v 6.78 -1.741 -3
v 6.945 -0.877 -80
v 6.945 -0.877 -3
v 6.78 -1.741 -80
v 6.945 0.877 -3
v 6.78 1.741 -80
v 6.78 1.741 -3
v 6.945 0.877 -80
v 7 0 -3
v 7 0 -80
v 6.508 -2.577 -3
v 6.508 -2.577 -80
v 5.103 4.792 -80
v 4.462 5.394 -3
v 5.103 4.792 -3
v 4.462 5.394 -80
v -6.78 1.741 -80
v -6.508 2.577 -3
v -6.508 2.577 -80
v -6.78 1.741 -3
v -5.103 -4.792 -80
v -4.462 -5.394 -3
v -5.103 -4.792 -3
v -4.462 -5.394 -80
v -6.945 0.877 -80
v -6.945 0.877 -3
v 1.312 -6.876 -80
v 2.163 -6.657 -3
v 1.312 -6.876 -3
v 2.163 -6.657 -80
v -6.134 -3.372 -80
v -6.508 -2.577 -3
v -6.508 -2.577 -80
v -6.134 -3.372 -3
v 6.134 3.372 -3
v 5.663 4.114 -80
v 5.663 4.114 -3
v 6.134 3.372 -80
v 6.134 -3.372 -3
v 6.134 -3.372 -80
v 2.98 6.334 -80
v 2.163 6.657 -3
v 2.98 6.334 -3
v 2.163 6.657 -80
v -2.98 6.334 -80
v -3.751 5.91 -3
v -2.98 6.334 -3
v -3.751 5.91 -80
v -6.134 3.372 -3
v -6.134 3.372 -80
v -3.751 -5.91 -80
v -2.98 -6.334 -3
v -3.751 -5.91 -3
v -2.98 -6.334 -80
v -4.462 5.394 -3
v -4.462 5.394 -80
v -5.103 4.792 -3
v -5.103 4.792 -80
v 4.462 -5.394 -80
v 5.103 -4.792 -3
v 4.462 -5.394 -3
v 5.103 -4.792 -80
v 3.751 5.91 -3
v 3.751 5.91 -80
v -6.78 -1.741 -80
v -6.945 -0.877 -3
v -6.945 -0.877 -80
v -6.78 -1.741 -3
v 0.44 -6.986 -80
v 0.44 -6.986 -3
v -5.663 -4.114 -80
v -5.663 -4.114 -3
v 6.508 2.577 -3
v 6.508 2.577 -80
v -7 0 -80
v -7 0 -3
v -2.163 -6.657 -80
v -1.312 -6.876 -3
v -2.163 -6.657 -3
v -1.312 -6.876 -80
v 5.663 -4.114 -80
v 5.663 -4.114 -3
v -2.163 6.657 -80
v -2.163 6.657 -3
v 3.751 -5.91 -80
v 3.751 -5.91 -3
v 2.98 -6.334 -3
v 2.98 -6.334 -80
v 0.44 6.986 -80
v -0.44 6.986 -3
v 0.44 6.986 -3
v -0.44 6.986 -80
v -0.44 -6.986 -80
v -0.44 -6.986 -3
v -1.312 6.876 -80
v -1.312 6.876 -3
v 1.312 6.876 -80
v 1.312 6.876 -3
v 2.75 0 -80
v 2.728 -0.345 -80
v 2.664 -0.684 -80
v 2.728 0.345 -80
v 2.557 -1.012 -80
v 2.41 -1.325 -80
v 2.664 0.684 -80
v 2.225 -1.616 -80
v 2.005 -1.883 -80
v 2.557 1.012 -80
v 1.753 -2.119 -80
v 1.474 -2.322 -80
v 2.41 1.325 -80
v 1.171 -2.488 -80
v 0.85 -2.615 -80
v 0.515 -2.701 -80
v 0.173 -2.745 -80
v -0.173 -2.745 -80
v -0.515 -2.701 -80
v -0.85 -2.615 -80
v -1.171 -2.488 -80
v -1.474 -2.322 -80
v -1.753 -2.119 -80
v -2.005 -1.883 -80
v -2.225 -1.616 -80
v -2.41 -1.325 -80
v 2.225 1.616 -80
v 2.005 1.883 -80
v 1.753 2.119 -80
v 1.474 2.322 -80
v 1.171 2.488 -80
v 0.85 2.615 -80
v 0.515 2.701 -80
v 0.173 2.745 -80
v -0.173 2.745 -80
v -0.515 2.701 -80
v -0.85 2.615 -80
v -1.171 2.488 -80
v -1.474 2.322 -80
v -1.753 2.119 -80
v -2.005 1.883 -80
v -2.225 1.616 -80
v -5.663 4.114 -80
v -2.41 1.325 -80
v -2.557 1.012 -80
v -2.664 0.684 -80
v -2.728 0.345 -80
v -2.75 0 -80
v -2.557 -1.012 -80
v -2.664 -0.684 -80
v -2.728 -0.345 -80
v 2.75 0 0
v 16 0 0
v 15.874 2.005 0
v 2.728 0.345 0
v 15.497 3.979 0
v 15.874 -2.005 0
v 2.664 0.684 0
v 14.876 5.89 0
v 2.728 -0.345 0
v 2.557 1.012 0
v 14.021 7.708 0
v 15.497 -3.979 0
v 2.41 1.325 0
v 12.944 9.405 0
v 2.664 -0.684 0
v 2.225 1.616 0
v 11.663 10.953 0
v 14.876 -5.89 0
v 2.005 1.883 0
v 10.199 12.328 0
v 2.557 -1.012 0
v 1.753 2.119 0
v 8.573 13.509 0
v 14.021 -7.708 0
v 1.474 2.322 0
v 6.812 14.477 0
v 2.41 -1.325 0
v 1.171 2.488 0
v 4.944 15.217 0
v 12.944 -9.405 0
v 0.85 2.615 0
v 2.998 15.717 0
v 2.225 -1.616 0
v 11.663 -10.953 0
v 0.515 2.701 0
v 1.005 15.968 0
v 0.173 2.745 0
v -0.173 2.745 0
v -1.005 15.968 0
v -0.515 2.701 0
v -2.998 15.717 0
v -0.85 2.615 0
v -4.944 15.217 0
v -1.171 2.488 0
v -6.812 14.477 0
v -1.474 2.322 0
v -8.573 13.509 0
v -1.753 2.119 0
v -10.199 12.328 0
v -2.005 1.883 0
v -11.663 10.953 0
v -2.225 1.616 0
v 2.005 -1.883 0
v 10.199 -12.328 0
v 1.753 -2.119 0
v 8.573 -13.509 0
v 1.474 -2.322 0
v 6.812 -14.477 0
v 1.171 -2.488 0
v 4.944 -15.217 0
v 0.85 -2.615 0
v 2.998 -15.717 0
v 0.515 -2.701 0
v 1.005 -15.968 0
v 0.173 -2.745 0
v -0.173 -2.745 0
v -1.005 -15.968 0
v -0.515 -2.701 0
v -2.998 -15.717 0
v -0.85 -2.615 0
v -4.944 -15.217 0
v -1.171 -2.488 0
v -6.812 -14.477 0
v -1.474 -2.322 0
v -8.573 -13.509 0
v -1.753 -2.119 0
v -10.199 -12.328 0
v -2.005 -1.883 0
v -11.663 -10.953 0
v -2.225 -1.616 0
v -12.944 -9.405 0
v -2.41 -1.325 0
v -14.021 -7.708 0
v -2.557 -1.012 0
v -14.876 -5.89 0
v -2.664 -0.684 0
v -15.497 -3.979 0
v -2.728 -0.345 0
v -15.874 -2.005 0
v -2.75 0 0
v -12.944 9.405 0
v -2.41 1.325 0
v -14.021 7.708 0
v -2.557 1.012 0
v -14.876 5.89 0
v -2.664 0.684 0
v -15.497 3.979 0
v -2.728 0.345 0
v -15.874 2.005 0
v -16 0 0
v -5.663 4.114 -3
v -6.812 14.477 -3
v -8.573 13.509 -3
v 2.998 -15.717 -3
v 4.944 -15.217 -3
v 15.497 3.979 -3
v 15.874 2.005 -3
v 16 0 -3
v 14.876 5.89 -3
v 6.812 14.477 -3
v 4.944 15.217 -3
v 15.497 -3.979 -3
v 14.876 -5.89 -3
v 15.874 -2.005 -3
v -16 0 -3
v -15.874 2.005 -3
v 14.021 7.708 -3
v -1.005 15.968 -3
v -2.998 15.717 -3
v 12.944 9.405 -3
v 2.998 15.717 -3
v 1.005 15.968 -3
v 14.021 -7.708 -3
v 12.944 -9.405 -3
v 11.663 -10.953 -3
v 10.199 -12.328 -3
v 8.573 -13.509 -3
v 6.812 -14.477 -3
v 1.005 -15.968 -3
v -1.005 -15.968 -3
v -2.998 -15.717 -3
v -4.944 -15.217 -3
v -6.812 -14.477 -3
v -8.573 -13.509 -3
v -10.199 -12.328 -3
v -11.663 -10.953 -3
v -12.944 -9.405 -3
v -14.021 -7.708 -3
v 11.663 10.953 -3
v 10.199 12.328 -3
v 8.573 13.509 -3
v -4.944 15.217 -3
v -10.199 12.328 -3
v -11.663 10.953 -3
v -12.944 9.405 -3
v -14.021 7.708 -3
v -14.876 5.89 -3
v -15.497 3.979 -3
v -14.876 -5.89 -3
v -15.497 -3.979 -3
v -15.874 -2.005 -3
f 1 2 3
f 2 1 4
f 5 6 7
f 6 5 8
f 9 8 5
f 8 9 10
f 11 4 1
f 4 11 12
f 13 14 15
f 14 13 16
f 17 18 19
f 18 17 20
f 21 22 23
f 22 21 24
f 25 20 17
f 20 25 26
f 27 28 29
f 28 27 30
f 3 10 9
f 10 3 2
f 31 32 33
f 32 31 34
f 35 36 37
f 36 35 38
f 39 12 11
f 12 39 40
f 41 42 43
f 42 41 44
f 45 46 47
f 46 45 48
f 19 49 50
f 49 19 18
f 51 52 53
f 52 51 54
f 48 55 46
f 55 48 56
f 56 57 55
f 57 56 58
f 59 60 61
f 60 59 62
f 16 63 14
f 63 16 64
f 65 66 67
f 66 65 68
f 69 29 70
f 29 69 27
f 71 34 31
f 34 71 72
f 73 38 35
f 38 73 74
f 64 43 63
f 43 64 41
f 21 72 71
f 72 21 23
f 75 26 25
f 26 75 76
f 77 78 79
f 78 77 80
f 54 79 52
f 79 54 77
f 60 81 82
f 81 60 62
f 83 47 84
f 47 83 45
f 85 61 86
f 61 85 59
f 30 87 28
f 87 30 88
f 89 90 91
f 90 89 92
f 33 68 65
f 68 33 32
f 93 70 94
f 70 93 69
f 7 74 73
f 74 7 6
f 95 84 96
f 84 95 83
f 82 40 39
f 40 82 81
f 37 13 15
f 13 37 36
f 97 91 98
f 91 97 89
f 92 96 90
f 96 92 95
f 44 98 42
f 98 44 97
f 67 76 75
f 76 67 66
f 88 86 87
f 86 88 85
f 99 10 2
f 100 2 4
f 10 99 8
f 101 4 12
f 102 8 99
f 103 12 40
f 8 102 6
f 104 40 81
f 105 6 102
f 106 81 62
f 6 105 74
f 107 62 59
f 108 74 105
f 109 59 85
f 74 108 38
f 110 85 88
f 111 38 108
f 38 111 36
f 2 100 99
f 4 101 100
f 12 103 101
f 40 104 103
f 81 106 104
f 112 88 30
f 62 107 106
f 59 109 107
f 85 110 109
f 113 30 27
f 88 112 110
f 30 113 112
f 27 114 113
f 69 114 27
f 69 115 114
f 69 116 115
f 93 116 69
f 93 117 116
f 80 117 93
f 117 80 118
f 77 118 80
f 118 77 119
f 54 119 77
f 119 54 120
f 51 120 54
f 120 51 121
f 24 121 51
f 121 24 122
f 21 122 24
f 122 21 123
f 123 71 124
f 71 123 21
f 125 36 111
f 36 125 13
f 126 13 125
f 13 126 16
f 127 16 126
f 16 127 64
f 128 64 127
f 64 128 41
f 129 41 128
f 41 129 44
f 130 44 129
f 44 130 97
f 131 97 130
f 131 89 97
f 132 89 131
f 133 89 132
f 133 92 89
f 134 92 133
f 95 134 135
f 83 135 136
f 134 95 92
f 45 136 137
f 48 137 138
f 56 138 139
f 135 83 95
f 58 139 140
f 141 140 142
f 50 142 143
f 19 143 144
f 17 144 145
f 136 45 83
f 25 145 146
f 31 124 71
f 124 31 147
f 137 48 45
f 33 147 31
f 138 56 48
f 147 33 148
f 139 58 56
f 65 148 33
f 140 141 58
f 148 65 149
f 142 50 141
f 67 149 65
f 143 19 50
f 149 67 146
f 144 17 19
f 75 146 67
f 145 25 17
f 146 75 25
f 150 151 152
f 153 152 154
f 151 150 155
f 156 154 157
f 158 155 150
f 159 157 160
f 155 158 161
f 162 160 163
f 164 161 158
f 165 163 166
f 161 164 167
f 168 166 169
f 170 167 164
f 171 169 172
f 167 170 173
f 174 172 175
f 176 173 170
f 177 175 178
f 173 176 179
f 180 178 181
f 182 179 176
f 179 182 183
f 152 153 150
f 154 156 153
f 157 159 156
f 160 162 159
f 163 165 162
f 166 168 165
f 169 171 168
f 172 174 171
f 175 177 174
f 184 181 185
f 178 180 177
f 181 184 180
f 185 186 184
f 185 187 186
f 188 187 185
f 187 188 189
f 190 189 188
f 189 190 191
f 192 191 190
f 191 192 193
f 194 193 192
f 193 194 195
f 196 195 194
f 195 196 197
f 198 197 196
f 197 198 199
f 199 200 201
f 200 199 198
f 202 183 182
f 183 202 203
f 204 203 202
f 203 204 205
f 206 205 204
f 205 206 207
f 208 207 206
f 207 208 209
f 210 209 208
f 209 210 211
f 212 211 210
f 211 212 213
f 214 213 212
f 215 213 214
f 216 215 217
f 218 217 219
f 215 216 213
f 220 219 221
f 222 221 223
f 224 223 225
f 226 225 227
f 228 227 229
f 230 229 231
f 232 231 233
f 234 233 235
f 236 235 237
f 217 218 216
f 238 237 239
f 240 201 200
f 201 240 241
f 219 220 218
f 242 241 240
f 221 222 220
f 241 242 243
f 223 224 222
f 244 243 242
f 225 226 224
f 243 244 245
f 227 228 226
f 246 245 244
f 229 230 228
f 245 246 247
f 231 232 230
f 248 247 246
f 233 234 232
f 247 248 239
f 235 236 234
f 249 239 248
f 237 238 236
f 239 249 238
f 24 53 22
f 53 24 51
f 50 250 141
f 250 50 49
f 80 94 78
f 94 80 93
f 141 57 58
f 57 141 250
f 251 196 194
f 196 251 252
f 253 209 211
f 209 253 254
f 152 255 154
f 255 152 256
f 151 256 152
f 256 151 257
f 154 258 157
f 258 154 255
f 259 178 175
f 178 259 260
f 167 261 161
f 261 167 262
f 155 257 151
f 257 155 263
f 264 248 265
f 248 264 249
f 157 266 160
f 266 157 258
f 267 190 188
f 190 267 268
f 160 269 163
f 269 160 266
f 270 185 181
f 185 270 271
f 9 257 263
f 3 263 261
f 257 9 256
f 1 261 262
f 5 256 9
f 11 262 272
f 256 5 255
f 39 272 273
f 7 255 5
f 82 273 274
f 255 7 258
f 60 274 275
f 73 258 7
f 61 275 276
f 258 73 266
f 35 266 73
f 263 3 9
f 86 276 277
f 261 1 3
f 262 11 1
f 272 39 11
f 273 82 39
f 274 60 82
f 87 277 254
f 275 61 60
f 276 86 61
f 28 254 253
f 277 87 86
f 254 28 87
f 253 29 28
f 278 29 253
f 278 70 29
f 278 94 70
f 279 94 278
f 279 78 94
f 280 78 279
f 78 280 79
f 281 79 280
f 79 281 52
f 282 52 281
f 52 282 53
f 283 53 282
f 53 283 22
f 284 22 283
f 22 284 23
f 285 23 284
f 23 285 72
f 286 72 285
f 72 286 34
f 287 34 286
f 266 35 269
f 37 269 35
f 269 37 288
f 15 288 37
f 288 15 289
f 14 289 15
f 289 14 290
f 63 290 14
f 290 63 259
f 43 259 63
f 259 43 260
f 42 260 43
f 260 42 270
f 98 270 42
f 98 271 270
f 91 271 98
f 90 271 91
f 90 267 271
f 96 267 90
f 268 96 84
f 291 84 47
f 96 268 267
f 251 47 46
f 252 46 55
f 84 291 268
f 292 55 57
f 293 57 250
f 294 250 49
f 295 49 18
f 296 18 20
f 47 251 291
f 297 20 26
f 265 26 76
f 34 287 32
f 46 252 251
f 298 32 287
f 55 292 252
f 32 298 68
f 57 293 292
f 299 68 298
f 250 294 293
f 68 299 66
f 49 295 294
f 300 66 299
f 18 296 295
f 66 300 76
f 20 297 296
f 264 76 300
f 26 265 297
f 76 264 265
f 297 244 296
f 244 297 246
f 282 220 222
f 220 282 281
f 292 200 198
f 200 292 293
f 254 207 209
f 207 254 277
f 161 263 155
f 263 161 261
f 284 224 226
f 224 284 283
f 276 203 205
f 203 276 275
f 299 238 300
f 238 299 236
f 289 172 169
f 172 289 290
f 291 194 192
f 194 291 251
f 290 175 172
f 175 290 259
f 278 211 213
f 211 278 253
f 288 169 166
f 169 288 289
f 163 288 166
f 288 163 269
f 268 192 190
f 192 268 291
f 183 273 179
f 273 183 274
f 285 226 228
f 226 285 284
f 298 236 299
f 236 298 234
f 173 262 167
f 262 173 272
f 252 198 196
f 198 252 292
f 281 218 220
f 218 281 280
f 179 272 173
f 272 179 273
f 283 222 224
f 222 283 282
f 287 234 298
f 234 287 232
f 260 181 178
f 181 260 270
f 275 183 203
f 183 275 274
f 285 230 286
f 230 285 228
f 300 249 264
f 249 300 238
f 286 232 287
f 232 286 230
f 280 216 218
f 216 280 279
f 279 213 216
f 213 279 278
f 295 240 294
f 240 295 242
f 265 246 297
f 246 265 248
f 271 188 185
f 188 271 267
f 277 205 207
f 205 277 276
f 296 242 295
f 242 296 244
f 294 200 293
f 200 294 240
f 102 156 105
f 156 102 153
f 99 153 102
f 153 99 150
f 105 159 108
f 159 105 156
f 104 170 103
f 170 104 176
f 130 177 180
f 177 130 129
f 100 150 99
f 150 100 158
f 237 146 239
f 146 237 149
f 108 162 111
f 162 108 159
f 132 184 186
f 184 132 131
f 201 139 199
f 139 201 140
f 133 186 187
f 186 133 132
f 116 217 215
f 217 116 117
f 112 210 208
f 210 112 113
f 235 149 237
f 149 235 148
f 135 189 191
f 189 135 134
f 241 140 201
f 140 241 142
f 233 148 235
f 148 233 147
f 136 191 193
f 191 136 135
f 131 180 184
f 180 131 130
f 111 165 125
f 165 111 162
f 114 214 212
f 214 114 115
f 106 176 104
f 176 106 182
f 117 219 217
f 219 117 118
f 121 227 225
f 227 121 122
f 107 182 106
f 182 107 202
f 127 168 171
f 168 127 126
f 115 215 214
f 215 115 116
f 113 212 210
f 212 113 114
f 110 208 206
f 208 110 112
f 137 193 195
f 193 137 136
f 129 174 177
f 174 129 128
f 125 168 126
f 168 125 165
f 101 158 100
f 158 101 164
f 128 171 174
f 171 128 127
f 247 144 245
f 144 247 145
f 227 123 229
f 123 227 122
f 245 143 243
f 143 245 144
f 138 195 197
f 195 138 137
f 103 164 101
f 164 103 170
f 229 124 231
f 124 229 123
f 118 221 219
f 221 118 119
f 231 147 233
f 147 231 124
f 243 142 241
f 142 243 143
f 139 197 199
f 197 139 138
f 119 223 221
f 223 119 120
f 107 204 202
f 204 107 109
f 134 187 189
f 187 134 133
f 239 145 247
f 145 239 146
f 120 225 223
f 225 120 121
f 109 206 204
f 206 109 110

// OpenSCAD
$fn = 50;


difference() {
	union() {
		translate(v = [0, 0, -80.0000000000]) {
			cylinder(h = 80, r = 7.0000000000);
		}
		translate(v = [0, 0, -3.0000000000]) {
			cylinder(h = 3, r = 16.0000000000);
		}
	}
	union() {
		#translate(v = [0, 0, -80]) {
			cylinder(h = 80, r = 2.7500000000);
		}
	}
}
